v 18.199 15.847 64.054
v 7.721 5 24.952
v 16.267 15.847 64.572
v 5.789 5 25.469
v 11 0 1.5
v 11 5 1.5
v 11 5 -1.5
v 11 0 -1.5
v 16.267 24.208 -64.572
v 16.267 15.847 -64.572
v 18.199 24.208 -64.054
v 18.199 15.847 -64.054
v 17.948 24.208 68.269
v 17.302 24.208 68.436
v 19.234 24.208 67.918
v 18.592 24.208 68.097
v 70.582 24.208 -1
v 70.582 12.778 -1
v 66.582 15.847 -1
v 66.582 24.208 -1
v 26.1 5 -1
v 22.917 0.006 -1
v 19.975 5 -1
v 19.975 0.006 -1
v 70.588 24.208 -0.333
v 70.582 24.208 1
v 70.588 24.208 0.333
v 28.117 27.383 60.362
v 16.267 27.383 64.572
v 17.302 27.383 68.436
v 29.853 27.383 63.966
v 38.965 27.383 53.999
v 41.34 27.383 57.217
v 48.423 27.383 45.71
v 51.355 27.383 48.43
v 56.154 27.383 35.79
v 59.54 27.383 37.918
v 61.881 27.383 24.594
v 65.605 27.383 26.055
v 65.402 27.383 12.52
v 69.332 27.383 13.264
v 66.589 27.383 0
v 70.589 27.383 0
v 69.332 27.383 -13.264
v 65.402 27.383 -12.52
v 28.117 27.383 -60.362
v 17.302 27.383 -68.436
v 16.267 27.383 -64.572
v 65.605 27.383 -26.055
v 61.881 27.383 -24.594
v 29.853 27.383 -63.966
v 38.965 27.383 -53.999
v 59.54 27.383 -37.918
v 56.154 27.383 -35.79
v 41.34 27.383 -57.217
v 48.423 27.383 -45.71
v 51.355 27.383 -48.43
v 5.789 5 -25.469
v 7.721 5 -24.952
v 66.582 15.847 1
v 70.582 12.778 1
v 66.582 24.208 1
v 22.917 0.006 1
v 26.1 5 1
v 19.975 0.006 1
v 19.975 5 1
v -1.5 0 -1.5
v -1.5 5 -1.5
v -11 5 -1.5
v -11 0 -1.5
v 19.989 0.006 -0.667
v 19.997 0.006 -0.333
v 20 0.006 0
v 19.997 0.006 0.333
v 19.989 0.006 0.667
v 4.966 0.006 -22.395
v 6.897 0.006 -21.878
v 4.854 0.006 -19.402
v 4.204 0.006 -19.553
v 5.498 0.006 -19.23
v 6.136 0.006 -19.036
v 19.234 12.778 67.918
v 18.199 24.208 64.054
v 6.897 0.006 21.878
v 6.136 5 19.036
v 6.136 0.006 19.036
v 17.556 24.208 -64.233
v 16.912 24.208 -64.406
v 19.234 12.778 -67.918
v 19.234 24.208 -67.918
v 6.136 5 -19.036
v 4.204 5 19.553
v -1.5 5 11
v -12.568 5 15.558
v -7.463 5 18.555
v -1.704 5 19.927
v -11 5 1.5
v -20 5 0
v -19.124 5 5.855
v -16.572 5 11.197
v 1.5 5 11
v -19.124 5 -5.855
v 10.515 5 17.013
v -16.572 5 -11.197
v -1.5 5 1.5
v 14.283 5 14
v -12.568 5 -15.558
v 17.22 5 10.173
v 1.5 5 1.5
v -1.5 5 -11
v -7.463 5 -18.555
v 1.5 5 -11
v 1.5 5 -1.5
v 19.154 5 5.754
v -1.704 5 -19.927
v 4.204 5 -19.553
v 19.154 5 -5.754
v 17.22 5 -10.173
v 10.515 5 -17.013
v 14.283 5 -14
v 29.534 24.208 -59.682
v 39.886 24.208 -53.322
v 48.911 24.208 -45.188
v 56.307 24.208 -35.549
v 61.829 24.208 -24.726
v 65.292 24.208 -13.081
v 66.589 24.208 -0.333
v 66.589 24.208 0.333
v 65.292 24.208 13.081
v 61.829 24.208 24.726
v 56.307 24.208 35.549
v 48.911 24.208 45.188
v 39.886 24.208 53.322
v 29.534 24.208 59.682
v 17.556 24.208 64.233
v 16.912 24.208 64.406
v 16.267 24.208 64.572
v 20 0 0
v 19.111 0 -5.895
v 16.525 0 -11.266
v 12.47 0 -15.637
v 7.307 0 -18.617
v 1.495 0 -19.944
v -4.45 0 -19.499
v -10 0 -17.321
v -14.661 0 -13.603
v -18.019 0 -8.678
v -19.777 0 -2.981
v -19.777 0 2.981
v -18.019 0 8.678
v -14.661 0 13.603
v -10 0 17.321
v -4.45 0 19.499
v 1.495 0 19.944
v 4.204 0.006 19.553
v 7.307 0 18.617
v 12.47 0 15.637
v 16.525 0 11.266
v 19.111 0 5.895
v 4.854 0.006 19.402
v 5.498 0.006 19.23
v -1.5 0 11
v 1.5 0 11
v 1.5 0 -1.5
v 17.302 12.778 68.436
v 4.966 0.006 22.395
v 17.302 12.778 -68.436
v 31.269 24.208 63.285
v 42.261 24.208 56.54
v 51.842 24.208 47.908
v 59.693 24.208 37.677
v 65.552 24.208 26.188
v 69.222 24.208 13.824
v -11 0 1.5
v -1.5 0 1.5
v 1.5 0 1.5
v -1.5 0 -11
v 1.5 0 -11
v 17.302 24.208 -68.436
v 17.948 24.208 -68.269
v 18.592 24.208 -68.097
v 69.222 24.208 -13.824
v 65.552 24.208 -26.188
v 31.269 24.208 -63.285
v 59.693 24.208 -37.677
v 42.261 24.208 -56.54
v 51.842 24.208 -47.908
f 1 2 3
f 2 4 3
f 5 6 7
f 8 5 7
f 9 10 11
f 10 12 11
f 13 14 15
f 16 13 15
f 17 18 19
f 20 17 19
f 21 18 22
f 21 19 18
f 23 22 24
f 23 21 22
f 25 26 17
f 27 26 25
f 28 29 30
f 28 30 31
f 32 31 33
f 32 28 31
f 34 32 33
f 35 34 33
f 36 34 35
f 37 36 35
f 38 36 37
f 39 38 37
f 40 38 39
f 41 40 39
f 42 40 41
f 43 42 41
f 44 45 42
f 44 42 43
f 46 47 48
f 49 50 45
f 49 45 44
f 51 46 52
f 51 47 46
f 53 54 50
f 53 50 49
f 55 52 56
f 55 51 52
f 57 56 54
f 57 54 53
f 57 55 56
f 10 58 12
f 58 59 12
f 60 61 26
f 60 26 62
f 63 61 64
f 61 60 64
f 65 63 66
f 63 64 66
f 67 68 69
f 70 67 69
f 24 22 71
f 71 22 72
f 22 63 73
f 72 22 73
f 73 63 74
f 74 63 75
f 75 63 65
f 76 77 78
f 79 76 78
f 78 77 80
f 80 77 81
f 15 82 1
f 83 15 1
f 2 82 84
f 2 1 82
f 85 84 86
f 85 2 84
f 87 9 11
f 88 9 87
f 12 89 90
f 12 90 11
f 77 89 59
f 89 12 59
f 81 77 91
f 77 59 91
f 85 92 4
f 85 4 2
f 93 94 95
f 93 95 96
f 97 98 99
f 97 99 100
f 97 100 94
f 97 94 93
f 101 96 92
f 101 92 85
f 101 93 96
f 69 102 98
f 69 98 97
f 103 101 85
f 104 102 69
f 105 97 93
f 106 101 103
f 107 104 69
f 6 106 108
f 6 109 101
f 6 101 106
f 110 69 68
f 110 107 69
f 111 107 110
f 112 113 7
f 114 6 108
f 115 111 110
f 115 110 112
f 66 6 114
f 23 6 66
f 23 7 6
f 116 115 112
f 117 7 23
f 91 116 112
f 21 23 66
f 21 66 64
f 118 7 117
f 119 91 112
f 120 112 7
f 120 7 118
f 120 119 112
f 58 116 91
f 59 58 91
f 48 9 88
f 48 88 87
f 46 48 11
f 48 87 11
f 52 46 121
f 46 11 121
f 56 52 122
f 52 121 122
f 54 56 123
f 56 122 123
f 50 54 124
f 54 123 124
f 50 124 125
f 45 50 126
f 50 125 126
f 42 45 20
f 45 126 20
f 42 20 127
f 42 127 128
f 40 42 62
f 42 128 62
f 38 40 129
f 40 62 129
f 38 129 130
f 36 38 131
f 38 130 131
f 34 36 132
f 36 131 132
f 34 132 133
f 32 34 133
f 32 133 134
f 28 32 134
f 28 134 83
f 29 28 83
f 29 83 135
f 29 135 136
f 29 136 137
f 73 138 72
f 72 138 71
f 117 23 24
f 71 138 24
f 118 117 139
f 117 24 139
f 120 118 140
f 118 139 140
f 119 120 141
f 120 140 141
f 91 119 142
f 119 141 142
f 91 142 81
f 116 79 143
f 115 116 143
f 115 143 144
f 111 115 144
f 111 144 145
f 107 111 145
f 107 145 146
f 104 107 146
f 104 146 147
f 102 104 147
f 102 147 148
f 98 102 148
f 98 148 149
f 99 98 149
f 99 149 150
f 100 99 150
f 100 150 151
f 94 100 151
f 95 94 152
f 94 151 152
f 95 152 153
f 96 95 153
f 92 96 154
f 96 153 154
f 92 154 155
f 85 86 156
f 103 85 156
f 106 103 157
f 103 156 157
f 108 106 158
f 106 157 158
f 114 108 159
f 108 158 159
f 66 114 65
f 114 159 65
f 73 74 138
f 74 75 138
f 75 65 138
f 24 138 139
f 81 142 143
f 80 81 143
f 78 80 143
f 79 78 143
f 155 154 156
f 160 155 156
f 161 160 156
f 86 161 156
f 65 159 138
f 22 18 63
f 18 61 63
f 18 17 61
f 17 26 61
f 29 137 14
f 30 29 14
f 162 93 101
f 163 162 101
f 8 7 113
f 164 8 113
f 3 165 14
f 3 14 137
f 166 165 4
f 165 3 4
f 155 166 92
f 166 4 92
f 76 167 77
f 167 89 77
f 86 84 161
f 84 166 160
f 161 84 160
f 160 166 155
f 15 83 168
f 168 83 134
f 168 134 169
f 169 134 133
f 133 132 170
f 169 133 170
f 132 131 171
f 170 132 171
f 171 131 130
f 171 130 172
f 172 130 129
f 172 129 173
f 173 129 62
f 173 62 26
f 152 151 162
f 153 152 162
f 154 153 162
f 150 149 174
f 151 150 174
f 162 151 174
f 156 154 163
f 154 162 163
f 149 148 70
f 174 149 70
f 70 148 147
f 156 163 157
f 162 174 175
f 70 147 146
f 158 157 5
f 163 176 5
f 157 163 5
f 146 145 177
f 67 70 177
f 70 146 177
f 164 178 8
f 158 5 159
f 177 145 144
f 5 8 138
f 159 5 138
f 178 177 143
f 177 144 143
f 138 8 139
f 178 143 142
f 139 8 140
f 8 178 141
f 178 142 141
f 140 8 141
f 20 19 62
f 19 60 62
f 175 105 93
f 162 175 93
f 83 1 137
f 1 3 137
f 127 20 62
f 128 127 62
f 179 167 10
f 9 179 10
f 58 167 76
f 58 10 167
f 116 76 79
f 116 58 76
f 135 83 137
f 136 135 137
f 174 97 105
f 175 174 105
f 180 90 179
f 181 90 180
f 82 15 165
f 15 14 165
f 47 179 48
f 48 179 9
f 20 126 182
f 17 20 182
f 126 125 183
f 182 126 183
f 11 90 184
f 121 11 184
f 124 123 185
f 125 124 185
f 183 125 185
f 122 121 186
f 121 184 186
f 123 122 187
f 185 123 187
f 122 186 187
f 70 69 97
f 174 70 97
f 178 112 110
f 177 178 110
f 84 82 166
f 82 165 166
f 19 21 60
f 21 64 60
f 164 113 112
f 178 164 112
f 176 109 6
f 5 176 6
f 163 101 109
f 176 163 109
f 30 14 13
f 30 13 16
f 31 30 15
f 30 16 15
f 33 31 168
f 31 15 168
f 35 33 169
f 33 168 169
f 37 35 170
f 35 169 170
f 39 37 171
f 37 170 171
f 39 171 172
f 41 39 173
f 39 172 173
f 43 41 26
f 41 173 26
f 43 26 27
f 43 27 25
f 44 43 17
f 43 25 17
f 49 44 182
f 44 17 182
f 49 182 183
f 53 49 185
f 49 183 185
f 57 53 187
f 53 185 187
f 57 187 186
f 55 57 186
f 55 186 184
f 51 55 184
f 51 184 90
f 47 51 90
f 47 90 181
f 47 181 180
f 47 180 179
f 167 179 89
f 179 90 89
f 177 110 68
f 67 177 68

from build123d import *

# Parameters (mm, degrees)
SKETCH1_R           = 20
BOSS_EXTRUDE1_DEPTH = 5
BOSS_EXTRUDE2_DEPTH = 1
CIRPATTERN1_COUNT   = 2
CIRPATTERN1_ANGLE   = 75
CIRPATTERN3_COUNT   = 2
CIRPATTERN3_ANGLE   = 75
CUT_EXTRUDE1_REACH  = 102.171
BOSS_EXTRUDE3_DEPTH = 3.175


with BuildPart() as part:
    # Sketch1 → Boss-Extrude1 (new body)
    with BuildSketch(Plane(origin=(0, 0, 0), x_dir=(1, 0, 0), z_dir=(0, 1, 0))):
        Circle(SKETCH1_R)
    extrude(amount=BOSS_EXTRUDE1_DEPTH)

    # Sketch2 → Boss-Extrude2 (add, symmetric)
    with BuildSketch(Plane.XY):
        Polygon((19.75, 5), (26.1, 5), (66.58195138, 15.84710618), (66.58195138, 24.207798228), (70.58195138, 24.207798228), (70.58195138, 12.777798228), (22.917269596, 0.006085237), (19.75, 0.006085237), align=None)
    boss_extrude2 = extrude(amount=BOSS_EXTRUDE2_DEPTH, both=True)

    # CirPattern1: Boss-Extrude2 ×2 about axis
    cirpattern1_axis = Axis((0, 5, 0), (0, 1, 0))
    for i in range(1, CIRPATTERN1_COUNT):
        add(boss_extrude2.rotate(cirpattern1_axis, i * CIRPATTERN1_ANGLE / (CIRPATTERN1_COUNT - 1)))

    # CirPattern3: Boss-Extrude2 ×2 about axis
    cirpattern3_axis = Axis((0, 0, 0), (0, -1, 0))
    for i in range(1, CIRPATTERN3_COUNT):
        add(boss_extrude2.rotate(cirpattern3_axis, i * CIRPATTERN3_ANGLE / (CIRPATTERN3_COUNT - 1)))

    # Sketch5 → Cut-Extrude1 (cut, up to next)
    with BuildSketch(Plane(origin=(0, 5, 0), x_dir=(1, 0, 0), z_dir=(0, 1, 0)), mode=Mode.PRIVATE) as cut_extrude1_sk1:
        Polygon((-11, -1.5), (-1.5, -1.5), (-1.5, -11), (1.5, -11), (1.5, -1.5), (11, -1.5), (11, 1.5), (1.5, 1.5), (1.5, 11), (-1.5, 11), (-1.5, 1.5), (-11, 1.5), align=None)
    cut_extrude1_tool1 = extrude(cut_extrude1_sk1.sketch, amount=-CUT_EXTRUDE1_REACH, mode=Mode.PRIVATE) & part.part
    add(cut_extrude1_tool1.solids().sort_by_distance((0, 5, 0))[0], mode=Mode.SUBTRACT)

    # Sketch7 → Boss-Extrude3 (add)
    with BuildSketch(Plane(origin=(0, 24.207798228, 0), x_dir=(1, 0, 0), z_dir=(0, 1, 0))):
        with BuildLine():
            Line((17.302027431, 68.435748753), (16.266751251, 64.572045448))
            ThreePointArc((16.266751251, 64.572045448), (66.589460499, 0), (16.266751251, -64.572045448))
            Line((16.266751251, -64.572045448), (17.302027431, -68.435748753))
            ThreePointArc((17.302027431, -68.435748753), (70.589034988, 0), (17.302027431, 68.435748753))
        make_face()
    extrude(amount=BOSS_EXTRUDE3_DEPTH)


solid = part.part
